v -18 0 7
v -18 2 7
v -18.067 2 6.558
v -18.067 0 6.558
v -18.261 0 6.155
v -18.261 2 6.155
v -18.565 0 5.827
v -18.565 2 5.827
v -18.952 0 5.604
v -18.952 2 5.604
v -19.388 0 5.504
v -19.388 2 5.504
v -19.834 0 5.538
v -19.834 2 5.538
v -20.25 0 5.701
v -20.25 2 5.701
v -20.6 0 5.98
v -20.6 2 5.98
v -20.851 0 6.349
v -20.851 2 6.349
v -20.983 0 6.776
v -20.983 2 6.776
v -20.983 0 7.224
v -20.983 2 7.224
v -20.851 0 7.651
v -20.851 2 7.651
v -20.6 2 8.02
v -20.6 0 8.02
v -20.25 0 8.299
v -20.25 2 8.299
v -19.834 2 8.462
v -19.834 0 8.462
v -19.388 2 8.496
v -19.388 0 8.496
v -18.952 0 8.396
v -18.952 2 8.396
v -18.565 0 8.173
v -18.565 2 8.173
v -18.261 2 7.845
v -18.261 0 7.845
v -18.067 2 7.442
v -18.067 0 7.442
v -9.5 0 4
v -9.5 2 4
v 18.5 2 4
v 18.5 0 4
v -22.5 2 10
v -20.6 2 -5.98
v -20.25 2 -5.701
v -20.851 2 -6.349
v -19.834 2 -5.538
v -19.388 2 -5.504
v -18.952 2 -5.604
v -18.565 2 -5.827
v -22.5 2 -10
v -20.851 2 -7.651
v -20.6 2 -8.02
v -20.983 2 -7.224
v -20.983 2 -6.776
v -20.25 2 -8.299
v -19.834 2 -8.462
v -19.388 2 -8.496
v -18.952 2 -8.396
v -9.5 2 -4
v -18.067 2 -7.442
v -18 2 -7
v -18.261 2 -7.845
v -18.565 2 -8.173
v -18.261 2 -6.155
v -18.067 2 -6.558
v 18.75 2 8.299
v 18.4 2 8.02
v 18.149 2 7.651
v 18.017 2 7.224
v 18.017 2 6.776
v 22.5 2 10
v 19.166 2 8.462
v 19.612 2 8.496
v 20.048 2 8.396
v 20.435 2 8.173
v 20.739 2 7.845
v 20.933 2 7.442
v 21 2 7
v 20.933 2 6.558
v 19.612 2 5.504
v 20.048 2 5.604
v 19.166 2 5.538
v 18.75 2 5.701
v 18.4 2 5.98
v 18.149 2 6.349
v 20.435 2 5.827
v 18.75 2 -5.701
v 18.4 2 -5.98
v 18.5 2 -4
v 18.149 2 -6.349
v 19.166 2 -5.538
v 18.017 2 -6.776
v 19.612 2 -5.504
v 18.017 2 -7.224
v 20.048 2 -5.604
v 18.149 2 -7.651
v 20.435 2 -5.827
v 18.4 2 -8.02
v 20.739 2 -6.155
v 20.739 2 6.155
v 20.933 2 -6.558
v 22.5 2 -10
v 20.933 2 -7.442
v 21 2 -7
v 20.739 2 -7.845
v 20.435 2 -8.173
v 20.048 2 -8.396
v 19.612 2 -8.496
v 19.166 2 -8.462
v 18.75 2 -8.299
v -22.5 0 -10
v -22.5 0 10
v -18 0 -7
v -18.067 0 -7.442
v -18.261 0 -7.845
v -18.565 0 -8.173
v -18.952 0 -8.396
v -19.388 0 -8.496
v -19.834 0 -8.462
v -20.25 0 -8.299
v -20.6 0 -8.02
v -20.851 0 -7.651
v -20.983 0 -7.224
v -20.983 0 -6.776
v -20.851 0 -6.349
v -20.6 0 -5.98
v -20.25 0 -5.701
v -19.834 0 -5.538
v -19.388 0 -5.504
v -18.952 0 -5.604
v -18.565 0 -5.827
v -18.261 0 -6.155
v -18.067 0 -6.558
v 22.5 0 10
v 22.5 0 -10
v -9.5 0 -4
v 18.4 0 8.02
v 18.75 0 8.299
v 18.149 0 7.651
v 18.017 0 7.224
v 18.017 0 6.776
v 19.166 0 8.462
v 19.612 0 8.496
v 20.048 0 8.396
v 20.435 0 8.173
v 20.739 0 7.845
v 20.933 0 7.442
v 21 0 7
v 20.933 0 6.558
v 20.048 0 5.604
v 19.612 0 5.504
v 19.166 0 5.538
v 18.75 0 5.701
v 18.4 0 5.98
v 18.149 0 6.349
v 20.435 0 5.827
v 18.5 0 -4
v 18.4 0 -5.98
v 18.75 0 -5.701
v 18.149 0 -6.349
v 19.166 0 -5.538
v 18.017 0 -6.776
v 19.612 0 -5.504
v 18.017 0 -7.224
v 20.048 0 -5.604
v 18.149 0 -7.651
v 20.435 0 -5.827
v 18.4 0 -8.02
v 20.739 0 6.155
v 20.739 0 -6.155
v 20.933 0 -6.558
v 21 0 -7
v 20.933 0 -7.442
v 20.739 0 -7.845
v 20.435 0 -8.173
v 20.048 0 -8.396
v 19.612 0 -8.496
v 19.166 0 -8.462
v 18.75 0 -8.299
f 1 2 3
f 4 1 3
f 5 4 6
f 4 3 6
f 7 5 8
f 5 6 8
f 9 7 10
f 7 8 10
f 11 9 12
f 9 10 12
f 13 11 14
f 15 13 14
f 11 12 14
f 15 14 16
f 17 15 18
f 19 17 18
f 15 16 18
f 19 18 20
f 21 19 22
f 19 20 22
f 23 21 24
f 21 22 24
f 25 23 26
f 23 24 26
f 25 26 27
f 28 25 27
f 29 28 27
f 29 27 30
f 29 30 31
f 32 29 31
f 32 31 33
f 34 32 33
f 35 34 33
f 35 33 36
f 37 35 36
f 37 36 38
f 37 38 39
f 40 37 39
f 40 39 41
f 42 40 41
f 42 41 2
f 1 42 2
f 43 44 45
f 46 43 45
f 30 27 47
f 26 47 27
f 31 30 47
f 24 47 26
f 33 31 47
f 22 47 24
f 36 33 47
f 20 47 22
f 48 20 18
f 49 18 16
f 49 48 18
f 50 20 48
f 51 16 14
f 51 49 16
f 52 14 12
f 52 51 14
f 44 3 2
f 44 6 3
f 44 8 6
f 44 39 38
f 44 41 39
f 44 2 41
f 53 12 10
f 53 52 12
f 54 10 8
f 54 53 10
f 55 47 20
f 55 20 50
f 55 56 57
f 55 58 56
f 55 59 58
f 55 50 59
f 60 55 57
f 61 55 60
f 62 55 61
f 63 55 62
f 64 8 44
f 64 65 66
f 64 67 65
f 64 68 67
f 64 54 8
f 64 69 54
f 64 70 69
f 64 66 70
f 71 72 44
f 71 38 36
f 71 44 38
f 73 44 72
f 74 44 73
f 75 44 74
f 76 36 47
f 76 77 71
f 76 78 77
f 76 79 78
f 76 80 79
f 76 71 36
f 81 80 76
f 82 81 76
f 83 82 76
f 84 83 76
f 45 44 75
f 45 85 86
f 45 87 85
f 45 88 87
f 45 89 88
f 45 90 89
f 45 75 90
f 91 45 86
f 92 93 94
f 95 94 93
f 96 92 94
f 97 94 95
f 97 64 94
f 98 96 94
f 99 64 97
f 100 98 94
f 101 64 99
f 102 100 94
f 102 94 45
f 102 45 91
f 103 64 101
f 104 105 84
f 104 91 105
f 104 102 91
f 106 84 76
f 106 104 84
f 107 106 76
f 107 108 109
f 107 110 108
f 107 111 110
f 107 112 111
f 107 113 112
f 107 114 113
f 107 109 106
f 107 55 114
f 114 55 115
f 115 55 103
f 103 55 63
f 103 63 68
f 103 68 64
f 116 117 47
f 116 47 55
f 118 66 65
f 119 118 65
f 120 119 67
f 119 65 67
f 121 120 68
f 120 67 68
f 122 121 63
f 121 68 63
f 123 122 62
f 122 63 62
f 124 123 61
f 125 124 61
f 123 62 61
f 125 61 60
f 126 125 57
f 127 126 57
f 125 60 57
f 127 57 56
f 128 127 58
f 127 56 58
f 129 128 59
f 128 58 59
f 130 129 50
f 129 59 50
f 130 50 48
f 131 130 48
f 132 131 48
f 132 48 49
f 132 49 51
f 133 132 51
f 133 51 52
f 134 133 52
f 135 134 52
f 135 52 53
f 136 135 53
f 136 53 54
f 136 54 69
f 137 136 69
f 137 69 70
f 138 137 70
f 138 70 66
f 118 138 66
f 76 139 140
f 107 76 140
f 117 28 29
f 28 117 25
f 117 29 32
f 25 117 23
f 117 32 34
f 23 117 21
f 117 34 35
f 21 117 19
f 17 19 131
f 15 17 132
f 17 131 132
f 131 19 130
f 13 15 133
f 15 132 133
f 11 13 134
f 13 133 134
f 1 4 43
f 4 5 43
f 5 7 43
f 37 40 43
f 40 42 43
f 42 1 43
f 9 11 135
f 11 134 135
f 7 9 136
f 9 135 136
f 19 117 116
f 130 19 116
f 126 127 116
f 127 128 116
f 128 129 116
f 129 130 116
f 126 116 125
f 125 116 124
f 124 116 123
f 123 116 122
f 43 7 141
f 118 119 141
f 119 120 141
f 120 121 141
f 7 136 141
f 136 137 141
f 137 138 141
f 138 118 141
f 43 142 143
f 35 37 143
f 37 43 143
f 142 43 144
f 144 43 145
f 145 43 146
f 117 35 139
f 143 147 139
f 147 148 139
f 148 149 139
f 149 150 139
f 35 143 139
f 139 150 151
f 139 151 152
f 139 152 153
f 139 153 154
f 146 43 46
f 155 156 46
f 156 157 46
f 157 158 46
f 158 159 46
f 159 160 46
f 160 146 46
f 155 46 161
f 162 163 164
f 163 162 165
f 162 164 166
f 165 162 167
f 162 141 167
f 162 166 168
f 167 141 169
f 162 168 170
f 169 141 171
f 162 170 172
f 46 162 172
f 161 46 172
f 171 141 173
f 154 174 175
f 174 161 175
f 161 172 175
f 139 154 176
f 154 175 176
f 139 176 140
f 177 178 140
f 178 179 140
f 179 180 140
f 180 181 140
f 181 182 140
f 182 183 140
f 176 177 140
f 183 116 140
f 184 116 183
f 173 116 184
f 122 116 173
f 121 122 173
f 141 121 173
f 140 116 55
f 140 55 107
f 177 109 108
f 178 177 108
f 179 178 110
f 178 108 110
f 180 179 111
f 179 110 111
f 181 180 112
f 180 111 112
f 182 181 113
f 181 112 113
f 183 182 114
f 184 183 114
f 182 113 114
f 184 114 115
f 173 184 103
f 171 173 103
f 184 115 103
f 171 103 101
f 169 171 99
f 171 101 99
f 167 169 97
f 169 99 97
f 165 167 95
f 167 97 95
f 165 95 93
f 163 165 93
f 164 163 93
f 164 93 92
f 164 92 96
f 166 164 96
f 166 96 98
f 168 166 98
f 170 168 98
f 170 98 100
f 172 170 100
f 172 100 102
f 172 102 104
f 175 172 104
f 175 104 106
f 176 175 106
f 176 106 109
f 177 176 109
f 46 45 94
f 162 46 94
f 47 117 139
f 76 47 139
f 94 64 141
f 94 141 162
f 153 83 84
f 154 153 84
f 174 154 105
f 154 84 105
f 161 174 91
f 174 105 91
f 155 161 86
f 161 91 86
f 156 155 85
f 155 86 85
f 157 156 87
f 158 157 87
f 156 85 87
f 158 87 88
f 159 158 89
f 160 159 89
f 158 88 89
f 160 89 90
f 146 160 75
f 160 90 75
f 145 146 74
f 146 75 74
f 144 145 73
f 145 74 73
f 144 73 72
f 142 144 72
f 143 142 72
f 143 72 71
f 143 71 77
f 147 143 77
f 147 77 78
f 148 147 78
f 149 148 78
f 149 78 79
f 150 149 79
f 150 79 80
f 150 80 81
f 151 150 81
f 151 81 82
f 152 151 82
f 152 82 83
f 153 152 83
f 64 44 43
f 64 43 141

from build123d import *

# Parameters (mm, degrees)
CROQUIS2_W              = 45
CROQUIS2_H              = 20
SALIENTE_EXTRUIR1_DEPTH = 2
CROQUIS3_R              = 1.5
CORTAR_EXTRUIR1_DEPTH   = 3
CROQUIS4_W              = 28
CROQUIS4_H              = 8
CORTAR_EXTRUIR2_DEPTH   = 3


with BuildPart() as part:
    # Croquis2 → Saliente-Extruir1 (new body)
    with BuildSketch(Plane(origin=(0, 0, 0), x_dir=(1, 0, 0), z_dir=(0, 1, 0))):
        Rectangle(CROQUIS2_W, CROQUIS2_H)
    extrude(amount=SALIENTE_EXTRUIR1_DEPTH)

    # Croquis3 → Cortar-Extruir1 (cut, through all)
    with BuildSketch(Plane(origin=(0, 2, 0), x_dir=(1, 0, 0), z_dir=(0, 1, 0))):
        with Locations((-19.5, 7)):
            Circle(CROQUIS3_R)
        with Locations((19.5, 7)):
            Circle(CROQUIS3_R)
        with Locations((-19.5, -7)):
            Circle(CROQUIS3_R)
        with Locations((19.5, -7)):
            Circle(CROQUIS3_R)
    extrude(amount=-CORTAR_EXTRUIR1_DEPTH, mode=Mode.SUBTRACT)

    # Croquis4 → Cortar-Extruir2 (cut, through all)
    with BuildSketch(Plane(origin=(0, 2, 0), x_dir=(1, 0, 0), z_dir=(0, 1, 0))):
        with Locations((4.5, 0)):
            Rectangle(CROQUIS4_W, CROQUIS4_H)
    extrude(amount=-CORTAR_EXTRUIR2_DEPTH, mode=Mode.SUBTRACT)


solid = part.part
